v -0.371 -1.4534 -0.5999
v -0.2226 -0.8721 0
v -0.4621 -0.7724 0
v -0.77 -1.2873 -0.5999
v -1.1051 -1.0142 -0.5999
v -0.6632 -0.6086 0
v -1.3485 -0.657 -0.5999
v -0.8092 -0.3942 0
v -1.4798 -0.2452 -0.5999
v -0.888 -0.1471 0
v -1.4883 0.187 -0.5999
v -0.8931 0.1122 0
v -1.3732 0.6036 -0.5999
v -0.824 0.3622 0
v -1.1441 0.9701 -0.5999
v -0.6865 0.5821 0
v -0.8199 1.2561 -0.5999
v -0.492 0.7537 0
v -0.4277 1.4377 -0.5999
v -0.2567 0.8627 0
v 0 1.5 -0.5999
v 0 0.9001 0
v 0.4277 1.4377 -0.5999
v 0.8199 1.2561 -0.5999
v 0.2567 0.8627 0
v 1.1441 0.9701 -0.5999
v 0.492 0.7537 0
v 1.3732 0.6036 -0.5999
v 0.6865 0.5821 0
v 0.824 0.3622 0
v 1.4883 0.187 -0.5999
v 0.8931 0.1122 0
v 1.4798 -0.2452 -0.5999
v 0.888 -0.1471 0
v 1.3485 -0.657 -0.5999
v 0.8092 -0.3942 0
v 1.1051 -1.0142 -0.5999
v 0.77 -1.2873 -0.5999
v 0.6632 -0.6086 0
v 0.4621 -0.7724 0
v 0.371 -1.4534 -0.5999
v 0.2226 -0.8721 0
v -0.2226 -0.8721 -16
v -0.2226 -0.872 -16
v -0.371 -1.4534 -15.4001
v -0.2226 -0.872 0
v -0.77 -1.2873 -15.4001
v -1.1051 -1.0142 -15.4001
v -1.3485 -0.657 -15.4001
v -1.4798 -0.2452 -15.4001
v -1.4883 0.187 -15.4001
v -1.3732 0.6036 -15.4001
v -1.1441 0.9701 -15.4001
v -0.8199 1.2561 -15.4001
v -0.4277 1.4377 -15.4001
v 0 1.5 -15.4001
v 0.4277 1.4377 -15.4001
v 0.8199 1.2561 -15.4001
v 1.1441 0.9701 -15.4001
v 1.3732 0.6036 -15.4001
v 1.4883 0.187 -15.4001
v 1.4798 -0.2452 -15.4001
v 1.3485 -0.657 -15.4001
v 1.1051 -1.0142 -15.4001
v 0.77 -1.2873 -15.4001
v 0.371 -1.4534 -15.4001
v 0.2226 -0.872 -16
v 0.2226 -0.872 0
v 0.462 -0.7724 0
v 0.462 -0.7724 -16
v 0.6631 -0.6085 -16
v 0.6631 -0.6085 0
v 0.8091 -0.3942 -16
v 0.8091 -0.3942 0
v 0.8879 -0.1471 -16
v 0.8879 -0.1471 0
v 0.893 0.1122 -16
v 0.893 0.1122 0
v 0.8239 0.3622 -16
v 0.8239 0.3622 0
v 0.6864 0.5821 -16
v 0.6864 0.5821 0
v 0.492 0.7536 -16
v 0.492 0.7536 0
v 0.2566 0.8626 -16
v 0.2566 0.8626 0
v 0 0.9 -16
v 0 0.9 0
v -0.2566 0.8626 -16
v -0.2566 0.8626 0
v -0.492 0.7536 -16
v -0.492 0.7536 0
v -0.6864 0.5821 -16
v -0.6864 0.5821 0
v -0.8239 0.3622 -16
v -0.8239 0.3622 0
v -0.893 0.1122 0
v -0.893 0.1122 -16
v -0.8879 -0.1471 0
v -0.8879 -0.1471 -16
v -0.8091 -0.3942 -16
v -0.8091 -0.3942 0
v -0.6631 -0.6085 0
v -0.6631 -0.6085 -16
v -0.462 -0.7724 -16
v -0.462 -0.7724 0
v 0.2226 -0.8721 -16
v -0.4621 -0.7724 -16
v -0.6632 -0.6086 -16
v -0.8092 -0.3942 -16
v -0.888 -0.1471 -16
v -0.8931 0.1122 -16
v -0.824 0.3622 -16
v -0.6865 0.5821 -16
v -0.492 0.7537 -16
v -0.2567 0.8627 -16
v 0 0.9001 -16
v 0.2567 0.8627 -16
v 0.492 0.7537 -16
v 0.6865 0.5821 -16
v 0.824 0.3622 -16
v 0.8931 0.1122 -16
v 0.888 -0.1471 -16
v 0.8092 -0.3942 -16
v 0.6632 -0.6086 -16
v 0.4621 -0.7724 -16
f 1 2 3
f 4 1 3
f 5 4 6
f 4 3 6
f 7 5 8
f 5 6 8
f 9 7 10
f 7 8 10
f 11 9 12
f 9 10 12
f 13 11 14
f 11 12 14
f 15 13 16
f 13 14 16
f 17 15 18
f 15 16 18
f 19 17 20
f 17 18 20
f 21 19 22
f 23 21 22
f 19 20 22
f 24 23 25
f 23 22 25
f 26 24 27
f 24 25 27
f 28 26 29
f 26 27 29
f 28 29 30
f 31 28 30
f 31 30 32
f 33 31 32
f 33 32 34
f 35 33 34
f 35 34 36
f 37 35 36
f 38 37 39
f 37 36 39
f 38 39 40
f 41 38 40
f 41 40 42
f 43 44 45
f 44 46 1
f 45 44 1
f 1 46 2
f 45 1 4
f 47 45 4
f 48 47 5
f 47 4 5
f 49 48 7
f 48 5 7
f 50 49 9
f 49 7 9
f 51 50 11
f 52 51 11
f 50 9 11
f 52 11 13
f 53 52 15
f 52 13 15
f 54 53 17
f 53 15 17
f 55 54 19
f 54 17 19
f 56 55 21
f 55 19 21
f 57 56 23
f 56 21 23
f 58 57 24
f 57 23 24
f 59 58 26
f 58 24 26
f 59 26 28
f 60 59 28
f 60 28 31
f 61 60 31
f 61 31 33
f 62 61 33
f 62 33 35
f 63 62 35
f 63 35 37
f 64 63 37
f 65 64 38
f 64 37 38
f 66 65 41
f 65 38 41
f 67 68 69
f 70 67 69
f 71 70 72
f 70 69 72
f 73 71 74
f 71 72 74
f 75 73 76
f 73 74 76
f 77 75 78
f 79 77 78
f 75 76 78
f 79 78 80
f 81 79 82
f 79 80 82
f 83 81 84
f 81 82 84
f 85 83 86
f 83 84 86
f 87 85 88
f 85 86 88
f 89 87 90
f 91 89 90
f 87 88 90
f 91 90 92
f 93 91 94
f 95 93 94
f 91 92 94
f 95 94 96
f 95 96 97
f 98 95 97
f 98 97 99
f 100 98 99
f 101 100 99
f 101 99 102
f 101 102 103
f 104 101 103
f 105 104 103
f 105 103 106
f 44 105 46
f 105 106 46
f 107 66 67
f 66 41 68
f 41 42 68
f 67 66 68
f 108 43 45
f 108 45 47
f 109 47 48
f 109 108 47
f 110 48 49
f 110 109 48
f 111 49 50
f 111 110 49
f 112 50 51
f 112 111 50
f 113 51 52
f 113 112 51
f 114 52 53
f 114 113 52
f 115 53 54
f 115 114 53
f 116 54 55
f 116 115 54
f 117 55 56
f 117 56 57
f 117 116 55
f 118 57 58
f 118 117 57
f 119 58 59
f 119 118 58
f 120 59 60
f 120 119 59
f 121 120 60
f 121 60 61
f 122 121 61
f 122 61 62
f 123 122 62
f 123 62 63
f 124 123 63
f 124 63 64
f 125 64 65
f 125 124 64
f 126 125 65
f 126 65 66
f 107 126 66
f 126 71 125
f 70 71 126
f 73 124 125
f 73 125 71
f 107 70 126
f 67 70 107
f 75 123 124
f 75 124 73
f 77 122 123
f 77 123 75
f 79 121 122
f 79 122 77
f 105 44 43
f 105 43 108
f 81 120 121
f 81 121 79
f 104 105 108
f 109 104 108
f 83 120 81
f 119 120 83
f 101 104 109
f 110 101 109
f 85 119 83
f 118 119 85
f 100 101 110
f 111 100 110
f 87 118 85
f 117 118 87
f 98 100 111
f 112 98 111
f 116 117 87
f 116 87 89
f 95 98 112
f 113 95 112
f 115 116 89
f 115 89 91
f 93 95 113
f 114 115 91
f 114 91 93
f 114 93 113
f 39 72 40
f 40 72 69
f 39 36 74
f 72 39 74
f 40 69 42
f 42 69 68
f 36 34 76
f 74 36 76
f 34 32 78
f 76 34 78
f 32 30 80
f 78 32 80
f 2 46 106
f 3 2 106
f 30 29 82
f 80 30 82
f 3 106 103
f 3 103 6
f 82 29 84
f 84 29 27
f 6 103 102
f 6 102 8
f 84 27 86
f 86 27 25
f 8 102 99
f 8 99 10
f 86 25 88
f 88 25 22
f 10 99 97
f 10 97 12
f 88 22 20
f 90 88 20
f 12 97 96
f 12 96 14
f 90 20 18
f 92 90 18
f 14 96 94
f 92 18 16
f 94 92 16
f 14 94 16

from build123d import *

# Parameters (mm, degrees)
BASE_EXTRUSION_DEPTH = 16
CHANFREIN1_SIZE      = 0.6


with BuildPart() as part:
    # Esquisse1 → Base-Extrusion (new body)
    with BuildSketch(Plane.XY):
        with BuildLine():
            Line((-0.222603523, -0.872036508), (-0.371005872, -1.45339418))
            ThreePointArc((-0.371005872, -1.45339418), (0, 1.5), (0.371005872, -1.45339418))
            Line((0.371005872, -1.45339418), (0.222603523, -0.872036508))
            ThreePointArc((0.222603523, -0.872036508), (0, 0.9), (-0.222603523, -0.872036508))
        make_face()
    extrude(amount=-BASE_EXTRUSION_DEPTH)

    # Chanfrein1
    chanfrein1_edges = [part.edges().sort_by_distance(p)[0] for p in [
        (0, 1.5, 0),
        (0, 1.5, -16),
    ]]
    chamfer(chanfrein1_edges, length=CHANFREIN1_SIZE - 0.0001)  # a hair under: the kernel refuses the full size


solid = part.part
